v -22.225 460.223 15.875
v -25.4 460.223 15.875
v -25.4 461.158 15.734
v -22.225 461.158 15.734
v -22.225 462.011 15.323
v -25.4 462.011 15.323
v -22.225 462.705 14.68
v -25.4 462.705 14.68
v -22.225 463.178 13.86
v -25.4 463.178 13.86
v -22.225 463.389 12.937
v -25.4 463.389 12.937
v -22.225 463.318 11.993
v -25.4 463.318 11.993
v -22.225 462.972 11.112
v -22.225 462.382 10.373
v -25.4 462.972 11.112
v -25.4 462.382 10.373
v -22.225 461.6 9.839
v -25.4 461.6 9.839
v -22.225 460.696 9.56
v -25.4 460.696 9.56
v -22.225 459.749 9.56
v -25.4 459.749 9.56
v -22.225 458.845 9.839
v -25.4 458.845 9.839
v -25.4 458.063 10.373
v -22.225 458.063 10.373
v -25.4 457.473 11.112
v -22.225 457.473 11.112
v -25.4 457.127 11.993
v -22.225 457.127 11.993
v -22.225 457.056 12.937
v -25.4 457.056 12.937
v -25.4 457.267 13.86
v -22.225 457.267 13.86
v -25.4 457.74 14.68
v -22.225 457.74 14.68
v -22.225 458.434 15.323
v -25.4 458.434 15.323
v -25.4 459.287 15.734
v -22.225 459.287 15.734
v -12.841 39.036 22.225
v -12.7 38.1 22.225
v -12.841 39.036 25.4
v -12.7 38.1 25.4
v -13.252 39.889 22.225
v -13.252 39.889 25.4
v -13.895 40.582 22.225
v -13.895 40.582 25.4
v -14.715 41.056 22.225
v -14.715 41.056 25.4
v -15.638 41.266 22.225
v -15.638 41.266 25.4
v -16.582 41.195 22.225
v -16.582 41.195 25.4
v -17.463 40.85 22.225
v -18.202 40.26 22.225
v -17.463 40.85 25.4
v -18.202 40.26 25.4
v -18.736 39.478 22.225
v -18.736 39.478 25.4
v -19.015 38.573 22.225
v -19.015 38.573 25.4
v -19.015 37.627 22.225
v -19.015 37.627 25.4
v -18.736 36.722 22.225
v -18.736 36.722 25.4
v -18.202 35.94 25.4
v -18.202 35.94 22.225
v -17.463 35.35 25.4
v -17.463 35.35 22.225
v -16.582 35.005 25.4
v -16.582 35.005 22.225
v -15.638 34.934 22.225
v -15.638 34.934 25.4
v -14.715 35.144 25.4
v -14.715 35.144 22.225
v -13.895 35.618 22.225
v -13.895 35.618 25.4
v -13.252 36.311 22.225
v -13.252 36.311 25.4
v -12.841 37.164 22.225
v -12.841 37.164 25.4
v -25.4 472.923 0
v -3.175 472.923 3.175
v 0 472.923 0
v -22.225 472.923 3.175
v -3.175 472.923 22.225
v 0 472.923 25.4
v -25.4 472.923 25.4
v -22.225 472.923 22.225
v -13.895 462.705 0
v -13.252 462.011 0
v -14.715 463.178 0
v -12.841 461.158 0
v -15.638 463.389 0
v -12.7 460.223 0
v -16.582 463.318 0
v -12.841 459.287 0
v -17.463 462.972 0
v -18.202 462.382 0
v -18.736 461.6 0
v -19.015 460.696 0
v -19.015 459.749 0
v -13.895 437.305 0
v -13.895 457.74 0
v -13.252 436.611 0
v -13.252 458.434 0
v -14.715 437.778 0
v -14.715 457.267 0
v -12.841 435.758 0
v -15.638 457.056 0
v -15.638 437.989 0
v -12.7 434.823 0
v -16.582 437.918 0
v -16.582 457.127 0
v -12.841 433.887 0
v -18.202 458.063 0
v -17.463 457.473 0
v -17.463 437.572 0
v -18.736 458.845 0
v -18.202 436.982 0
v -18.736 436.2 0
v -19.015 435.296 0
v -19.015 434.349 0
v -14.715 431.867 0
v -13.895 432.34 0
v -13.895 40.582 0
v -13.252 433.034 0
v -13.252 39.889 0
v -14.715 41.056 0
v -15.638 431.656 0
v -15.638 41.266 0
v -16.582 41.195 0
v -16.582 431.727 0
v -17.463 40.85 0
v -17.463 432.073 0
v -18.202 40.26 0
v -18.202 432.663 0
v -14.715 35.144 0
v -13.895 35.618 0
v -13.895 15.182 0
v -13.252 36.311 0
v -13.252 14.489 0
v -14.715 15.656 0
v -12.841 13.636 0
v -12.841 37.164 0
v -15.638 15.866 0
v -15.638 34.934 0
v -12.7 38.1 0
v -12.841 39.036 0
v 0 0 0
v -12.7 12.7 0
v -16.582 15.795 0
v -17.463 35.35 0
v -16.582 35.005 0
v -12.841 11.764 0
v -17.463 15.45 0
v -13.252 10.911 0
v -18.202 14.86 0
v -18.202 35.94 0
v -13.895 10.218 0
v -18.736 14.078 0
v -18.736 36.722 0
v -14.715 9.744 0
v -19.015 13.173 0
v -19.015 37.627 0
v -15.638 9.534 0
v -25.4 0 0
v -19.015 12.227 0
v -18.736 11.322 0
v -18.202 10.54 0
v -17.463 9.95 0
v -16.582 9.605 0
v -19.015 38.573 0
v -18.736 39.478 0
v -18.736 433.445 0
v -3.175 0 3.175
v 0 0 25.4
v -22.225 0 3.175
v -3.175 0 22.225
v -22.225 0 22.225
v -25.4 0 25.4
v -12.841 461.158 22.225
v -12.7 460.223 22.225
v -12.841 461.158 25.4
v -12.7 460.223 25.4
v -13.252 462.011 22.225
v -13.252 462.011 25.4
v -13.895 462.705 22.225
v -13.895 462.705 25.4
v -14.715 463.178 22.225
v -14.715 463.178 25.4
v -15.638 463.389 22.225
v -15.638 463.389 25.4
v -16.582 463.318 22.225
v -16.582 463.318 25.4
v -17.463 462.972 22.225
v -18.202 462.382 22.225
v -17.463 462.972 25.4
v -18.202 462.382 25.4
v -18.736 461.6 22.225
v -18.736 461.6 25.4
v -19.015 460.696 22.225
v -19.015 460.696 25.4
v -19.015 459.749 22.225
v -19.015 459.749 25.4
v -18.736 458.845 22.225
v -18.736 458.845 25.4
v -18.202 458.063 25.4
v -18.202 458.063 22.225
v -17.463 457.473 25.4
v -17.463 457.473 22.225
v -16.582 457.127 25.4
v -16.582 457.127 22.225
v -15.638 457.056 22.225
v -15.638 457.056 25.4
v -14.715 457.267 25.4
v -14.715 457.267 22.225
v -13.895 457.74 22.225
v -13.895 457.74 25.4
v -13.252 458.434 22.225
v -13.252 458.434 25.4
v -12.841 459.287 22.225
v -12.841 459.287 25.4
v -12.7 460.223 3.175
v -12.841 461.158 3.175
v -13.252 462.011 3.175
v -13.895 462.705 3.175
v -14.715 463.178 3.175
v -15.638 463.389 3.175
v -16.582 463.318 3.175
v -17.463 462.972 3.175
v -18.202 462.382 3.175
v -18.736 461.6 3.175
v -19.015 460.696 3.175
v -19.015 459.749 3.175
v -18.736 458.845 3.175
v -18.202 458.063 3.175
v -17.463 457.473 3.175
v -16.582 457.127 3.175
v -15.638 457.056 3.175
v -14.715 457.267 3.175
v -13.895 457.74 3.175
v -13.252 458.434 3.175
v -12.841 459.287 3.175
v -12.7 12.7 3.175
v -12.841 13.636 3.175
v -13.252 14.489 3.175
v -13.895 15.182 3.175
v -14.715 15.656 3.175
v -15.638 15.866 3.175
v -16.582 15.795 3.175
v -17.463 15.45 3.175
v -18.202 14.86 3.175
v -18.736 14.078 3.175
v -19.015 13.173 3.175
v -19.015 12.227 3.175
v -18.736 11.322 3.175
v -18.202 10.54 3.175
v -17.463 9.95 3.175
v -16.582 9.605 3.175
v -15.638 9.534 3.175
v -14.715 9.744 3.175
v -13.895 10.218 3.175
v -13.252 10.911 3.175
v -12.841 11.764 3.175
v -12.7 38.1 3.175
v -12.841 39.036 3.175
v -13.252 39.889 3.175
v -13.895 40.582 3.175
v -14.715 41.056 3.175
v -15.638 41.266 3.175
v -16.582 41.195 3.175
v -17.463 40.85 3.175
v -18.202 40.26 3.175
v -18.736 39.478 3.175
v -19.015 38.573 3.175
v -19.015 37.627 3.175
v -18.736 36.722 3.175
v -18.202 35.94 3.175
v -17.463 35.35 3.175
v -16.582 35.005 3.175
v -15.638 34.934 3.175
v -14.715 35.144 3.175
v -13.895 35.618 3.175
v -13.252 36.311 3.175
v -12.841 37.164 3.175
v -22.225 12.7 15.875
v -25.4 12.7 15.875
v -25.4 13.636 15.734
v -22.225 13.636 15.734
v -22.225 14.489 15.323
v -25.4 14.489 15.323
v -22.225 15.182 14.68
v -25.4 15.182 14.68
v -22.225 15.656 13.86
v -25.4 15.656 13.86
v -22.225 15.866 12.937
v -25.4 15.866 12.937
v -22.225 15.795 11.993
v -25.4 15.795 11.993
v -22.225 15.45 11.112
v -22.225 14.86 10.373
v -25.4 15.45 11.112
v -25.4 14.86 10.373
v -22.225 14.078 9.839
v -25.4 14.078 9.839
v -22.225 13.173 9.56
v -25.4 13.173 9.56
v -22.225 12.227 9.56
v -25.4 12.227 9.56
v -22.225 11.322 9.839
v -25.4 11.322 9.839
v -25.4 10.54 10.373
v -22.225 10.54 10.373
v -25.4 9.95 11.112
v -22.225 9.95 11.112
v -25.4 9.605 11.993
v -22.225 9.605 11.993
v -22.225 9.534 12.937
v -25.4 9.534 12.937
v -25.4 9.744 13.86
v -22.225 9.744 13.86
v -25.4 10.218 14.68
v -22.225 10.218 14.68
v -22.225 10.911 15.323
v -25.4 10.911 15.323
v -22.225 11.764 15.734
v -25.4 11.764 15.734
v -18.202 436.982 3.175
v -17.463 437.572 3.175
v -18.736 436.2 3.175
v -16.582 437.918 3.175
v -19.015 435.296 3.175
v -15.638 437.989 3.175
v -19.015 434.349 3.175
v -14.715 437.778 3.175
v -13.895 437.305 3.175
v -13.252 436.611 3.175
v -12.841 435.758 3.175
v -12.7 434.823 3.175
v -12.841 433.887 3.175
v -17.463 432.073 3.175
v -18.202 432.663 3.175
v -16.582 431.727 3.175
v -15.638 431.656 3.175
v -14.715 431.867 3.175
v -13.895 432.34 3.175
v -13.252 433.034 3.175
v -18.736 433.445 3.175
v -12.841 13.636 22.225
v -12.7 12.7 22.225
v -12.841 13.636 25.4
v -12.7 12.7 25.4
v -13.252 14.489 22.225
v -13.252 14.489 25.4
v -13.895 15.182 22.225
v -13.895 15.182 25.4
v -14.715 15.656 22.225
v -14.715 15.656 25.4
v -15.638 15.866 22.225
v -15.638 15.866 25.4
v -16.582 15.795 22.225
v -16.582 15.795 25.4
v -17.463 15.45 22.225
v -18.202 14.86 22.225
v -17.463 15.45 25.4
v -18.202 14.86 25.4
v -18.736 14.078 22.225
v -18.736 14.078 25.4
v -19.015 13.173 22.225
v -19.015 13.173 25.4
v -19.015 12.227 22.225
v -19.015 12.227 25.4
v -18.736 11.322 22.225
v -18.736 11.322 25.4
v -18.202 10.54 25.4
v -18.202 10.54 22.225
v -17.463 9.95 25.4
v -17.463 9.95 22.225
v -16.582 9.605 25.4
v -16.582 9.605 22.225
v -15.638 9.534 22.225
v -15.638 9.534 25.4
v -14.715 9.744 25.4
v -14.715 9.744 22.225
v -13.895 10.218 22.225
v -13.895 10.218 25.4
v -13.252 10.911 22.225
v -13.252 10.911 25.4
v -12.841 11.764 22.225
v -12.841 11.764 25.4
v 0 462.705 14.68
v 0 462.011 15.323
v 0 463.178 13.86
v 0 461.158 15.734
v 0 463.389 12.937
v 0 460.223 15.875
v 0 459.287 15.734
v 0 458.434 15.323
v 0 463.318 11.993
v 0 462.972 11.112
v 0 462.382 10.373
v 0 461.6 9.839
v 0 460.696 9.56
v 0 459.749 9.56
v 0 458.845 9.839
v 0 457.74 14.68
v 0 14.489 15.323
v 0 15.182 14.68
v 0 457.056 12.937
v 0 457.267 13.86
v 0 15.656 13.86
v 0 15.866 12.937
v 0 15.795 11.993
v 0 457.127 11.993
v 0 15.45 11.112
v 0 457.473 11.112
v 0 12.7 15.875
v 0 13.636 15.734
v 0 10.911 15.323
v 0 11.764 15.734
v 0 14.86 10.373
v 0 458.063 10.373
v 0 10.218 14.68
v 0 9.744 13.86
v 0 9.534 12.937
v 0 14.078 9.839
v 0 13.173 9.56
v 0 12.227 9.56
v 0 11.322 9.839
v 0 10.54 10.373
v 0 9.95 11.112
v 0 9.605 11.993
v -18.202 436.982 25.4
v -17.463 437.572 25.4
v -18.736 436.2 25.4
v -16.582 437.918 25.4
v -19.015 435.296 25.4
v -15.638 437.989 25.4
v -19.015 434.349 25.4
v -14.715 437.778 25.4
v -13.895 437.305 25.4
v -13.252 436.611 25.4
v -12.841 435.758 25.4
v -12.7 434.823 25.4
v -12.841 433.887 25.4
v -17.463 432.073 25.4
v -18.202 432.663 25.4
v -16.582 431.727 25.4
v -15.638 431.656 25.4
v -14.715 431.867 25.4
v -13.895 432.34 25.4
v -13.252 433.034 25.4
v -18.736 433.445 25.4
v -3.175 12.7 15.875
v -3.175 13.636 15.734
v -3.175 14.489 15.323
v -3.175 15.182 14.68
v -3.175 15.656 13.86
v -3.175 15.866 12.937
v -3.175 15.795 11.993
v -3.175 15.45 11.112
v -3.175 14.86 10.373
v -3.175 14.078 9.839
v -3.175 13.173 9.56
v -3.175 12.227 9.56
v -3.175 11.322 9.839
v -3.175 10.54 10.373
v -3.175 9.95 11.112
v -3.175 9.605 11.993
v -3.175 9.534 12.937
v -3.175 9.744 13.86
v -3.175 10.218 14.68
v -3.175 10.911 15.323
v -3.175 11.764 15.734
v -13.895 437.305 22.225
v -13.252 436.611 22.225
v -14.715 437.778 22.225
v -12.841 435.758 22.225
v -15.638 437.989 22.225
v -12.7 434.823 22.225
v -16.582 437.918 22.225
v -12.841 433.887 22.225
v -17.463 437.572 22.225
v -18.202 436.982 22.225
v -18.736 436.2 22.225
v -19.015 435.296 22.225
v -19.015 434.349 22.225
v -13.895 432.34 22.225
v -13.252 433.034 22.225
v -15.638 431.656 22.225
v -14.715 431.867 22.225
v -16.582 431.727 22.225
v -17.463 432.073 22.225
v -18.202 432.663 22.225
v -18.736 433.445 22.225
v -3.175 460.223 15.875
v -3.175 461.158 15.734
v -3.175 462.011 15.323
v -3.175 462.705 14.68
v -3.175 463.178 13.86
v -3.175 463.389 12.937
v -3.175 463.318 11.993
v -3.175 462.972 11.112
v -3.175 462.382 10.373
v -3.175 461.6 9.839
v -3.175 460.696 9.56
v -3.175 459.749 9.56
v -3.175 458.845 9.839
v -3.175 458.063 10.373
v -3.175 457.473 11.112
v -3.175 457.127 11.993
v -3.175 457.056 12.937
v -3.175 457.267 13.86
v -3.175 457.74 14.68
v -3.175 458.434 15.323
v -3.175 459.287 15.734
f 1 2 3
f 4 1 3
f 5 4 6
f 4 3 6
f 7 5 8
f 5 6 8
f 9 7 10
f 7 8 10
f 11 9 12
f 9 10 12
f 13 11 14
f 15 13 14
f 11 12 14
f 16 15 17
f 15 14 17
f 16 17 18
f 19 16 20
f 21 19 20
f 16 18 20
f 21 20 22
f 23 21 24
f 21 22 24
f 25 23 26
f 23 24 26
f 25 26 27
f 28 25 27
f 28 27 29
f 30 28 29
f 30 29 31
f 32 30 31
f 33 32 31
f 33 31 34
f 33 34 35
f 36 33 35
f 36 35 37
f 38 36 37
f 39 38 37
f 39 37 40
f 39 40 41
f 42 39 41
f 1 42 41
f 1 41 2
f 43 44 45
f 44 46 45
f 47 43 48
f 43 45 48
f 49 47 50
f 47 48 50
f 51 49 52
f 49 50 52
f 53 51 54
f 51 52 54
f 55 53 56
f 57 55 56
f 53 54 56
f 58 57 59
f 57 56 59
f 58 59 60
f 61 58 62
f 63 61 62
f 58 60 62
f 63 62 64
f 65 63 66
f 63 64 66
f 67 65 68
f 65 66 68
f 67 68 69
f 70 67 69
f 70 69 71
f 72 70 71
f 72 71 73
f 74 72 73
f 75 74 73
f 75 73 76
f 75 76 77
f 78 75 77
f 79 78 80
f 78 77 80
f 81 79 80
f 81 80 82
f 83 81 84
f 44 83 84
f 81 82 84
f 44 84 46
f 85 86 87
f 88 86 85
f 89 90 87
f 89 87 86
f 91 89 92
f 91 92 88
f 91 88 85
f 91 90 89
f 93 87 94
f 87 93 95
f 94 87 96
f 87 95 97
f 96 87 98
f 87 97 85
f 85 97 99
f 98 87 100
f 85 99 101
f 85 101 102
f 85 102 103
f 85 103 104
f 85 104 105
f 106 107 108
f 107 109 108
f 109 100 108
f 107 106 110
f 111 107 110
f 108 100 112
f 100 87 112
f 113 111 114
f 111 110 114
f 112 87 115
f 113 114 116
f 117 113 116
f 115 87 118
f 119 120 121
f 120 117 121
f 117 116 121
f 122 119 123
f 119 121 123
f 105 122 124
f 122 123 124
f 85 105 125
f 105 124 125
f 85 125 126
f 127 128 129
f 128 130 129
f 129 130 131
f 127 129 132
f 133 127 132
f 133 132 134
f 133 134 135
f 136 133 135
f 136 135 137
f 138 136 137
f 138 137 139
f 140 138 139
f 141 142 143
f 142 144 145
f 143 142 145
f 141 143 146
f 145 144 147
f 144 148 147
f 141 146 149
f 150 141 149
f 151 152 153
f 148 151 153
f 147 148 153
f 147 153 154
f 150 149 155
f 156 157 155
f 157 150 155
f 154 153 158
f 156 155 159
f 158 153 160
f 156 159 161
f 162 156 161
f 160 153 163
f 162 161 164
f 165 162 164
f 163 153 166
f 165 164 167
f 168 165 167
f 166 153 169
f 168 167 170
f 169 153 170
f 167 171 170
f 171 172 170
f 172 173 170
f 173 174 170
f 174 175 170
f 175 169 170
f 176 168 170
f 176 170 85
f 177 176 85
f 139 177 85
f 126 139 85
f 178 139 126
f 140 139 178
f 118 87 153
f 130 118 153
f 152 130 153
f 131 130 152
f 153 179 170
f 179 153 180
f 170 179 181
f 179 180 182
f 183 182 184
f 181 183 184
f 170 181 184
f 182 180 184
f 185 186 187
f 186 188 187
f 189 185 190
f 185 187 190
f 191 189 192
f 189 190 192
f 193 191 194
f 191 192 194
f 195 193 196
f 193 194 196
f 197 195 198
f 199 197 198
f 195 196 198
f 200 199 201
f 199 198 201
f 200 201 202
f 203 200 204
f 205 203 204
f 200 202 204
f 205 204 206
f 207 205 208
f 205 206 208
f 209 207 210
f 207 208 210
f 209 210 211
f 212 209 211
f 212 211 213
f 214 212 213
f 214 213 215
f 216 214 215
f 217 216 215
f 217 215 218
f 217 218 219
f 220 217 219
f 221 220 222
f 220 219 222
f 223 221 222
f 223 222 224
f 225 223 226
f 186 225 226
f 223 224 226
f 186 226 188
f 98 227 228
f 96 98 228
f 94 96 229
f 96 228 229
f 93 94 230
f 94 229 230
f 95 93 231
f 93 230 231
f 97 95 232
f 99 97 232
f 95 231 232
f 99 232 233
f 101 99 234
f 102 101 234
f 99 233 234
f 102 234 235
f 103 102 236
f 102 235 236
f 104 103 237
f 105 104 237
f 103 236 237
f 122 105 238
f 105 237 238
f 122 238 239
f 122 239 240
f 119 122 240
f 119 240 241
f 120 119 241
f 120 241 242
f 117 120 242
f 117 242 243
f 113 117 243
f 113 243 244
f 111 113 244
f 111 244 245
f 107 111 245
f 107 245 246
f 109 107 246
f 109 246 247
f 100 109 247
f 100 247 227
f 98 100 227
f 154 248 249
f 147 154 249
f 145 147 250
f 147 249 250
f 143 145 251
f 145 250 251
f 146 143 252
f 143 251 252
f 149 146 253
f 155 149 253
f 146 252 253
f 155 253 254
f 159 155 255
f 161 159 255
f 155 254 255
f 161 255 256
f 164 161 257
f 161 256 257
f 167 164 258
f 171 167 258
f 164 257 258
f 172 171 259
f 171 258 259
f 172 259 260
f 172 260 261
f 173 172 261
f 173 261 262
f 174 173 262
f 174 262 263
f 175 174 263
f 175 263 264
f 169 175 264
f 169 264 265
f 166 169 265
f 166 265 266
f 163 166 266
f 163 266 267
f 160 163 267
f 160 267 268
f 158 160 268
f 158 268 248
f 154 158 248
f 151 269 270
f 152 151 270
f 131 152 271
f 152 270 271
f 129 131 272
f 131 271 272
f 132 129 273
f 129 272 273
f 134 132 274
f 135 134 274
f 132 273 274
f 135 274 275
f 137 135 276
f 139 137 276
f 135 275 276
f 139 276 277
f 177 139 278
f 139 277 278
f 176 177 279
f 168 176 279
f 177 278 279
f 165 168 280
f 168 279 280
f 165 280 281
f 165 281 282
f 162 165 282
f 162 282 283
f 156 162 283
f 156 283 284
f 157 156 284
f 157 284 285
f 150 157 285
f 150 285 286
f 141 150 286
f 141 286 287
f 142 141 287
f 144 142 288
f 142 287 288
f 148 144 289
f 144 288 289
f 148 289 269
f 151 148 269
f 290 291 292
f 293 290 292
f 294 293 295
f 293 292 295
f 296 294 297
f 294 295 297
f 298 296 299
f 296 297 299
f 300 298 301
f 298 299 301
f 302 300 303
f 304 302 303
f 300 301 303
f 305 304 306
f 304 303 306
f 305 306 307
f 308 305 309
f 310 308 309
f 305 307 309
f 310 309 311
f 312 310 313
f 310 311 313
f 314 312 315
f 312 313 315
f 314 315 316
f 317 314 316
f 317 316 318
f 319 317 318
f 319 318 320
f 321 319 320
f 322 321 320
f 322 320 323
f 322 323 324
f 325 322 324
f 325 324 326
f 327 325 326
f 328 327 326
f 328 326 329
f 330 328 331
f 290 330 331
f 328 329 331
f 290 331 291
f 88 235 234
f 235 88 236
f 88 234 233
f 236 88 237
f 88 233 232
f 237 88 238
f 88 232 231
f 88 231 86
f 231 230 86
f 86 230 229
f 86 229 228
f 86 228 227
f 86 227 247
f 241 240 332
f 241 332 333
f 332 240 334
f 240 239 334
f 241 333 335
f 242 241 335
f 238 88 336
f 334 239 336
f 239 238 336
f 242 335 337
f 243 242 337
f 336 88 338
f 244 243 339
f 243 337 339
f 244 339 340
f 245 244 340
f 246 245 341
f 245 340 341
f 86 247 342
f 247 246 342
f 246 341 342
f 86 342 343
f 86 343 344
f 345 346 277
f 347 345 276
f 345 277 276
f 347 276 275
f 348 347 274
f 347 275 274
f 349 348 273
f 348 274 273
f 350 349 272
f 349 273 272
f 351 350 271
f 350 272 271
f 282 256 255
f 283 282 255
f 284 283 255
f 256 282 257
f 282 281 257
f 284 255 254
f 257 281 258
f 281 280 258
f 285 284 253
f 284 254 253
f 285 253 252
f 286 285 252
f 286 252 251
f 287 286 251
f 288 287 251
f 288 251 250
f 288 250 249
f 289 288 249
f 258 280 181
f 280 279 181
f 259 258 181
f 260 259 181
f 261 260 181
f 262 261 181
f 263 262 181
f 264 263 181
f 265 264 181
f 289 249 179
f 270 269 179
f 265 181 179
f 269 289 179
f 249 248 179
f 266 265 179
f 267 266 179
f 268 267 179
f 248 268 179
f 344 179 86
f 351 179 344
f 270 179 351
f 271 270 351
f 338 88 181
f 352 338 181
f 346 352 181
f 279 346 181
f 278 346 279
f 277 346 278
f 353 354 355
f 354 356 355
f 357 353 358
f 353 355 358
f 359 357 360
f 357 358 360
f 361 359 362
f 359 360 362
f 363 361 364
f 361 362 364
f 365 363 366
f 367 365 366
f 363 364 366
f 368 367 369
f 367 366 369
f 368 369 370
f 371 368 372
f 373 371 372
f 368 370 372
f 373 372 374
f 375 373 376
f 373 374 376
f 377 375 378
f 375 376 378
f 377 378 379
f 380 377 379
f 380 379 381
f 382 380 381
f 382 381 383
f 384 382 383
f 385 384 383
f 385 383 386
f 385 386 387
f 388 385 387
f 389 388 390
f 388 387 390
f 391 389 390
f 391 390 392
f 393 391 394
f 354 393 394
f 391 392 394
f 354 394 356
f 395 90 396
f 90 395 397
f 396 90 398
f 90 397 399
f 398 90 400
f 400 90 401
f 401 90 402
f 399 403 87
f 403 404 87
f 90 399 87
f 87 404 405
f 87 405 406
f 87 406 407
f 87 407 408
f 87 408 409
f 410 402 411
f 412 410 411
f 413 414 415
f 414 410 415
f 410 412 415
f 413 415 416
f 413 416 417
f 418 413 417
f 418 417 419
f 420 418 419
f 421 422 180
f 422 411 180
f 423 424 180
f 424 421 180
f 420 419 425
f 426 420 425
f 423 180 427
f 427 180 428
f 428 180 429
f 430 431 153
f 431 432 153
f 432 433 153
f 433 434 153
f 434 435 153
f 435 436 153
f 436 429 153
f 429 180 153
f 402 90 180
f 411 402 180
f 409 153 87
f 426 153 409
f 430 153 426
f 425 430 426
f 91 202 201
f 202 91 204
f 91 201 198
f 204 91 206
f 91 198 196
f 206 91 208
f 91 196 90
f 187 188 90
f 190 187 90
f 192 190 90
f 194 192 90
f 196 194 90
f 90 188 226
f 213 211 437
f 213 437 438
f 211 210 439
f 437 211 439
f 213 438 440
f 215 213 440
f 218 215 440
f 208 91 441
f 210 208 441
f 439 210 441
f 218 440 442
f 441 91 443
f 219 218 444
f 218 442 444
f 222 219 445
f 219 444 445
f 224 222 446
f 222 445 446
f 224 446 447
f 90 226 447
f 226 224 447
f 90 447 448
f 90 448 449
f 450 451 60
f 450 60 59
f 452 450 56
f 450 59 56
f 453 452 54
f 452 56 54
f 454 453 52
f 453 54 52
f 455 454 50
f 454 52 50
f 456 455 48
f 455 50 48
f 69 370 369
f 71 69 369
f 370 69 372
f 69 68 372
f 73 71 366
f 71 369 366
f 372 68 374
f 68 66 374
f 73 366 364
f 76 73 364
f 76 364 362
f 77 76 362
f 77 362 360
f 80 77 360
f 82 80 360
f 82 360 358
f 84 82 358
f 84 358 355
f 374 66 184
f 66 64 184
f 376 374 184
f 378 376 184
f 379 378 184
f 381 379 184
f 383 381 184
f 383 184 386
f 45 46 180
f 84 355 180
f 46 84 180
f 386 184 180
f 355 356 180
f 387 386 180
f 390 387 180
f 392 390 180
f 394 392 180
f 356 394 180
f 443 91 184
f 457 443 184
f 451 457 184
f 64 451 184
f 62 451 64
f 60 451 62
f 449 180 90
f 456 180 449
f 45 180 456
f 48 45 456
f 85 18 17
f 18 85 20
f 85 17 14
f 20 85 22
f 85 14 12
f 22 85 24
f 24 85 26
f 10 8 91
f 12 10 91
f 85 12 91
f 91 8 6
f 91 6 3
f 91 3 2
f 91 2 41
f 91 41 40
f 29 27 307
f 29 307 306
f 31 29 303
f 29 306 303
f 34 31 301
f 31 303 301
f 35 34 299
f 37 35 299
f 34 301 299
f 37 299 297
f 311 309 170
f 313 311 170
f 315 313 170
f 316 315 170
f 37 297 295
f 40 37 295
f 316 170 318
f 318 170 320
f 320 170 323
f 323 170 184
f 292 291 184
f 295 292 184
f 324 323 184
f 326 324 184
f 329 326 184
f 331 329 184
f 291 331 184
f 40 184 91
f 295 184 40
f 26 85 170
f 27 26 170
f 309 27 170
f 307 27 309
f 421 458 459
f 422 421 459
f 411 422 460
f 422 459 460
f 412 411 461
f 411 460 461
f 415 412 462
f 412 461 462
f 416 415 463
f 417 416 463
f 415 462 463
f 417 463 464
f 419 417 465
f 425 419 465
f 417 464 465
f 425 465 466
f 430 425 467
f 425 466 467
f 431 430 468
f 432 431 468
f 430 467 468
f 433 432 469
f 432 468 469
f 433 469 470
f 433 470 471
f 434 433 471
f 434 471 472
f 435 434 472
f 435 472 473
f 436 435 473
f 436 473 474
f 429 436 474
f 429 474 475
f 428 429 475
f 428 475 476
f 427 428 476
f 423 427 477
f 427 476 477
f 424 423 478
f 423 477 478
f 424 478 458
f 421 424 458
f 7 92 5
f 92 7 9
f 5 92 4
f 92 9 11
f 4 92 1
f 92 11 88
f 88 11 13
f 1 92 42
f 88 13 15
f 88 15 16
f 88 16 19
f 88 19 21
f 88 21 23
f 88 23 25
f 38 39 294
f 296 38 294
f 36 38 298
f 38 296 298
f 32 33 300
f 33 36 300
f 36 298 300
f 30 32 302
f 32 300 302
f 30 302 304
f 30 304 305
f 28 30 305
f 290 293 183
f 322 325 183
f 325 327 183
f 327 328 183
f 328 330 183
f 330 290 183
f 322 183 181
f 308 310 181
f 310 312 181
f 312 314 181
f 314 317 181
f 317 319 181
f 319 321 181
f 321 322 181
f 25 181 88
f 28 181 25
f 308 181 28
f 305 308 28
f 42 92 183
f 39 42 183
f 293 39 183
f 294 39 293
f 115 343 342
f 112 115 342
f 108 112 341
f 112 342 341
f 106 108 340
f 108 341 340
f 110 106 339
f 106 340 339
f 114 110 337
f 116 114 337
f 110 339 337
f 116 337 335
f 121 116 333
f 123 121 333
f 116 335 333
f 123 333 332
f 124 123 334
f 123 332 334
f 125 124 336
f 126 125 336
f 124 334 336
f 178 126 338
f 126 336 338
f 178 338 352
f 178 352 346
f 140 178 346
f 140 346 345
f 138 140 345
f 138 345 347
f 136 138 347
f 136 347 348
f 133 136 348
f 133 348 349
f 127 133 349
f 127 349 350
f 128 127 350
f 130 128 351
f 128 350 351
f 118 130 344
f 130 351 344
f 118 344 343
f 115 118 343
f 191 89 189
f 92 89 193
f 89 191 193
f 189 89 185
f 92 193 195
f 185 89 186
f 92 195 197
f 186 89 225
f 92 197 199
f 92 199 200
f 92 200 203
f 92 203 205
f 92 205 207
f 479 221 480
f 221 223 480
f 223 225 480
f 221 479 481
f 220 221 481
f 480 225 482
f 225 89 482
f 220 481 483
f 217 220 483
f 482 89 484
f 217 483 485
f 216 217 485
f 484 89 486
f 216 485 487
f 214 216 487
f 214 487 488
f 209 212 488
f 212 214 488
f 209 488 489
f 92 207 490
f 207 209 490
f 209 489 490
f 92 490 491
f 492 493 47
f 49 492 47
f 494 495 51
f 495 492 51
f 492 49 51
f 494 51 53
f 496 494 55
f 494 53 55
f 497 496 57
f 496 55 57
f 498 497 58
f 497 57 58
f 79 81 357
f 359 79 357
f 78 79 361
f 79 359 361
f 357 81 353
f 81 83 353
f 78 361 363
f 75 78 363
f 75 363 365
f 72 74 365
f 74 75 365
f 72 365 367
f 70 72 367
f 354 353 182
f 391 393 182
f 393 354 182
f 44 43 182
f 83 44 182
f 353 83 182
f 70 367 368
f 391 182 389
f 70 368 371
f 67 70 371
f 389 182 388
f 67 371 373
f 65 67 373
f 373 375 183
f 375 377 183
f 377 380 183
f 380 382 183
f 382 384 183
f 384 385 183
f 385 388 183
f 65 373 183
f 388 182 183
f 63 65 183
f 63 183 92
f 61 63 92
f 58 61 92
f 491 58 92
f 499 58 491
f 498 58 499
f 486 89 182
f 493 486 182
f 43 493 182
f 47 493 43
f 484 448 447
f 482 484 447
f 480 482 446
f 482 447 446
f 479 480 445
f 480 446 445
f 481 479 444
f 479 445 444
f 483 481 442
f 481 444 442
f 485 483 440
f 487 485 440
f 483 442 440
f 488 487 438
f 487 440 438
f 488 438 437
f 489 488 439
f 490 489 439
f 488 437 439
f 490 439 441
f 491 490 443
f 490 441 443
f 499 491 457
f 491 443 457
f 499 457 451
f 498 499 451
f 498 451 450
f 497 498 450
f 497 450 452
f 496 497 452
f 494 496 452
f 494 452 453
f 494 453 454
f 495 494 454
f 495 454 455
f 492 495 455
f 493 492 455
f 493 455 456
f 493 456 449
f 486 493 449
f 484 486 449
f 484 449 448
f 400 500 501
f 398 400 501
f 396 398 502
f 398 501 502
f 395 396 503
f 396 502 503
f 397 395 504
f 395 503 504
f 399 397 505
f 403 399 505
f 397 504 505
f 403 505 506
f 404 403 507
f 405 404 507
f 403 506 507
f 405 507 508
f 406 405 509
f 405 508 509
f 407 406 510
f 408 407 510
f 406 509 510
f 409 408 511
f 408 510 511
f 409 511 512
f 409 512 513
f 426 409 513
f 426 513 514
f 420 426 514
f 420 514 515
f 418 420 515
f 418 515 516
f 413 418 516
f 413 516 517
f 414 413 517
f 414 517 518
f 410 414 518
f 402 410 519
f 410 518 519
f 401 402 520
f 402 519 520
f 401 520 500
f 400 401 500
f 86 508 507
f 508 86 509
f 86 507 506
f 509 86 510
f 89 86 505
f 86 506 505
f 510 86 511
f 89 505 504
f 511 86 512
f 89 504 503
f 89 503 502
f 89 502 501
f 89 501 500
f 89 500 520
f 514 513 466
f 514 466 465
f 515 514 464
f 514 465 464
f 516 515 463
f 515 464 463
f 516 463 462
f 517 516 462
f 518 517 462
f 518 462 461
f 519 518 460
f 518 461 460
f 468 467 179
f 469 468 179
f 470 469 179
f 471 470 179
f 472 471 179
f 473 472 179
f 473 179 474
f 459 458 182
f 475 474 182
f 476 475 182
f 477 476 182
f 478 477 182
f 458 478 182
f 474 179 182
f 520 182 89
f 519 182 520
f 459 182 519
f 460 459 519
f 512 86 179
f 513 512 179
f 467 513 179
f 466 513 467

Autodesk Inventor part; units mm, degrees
ref_plane "YZ Plane" through (0, 0, 0) normal (1, 0, 0) x (0, 1, 0)
ref_plane "XZ Plane" through (0, 0, 0) normal (0, 1, 0) x (-1, 0, 0)
ref_plane "XY Plane" through (0, 0, 0) normal (0, 0, 1) x (1, 0, 0)
sketch "Sketch1" plane through (0, 0, 0) normal (0, 1, 0) x (-1, 0, 0)
  line L0 (0, 0) -> (25.4, 0)
  line L1 (25.4, 0) -> (25.4, 25.4)
  line L2 (25.4, 25.4) -> (0, 25.4)
  line L3 (0, 25.4) -> (0, 0)
  line L4 (22.225, 22.225) -> (22.225, 3.175)
  line L5 (22.225, 3.175) -> (3.175, 3.175)
  line L6 (3.175, 3.175) -> (3.175, 22.225)
  line L7 (3.175, 22.225) -> (22.225, 22.225)
  dimension "d0" = 25.4
  dimension "d1" = 25.4
  dimension "d2" = 3.175
extrude "Extrusion1" add sketch "Sketch1" along normal blind 472.9226
sketch "Sketch2" plane through (-25.4, 0, 0) normal (-1, 0, 0) x (0, 0, 1)
  circle A0 centre (12.7, 12.7) radius 3.175
  circle A1 centre (12.7, 460.2226) radius 3.175
  line L0 (22.225, 472.9226) -> (3.175, 472.9226) projected
  line L1 (25.4, 0) -> (25.4, 472.9226) projected
  line L2 (25.4, 0) -> (25.4, 472.9226) projected
  line L3 (0, 0) -> (25.4, 0) projected
  dimension "d5" = 6.35
  dimension "d6" = 6.35
  dimension "d7" = 12.7
  dimension "d8" = 12.7
  dimension "d9" = 12.7
  dimension "d10" = 12.7
extrude "Extrusion2" cut sketch "Sketch2" against normal blind 25.4
sketch "Sketch3" plane through (-25.4, 0, 25.4) normal (0, 0, 1) x (1, 0, 0)
  circle A0 centre (9.525, 460.2226) radius 3.175
  circle A1 centre (9.525, 434.8226) radius 3.175
  line L0 (0, 472.9226) -> (25.4, 472.9226) projected
  line L1 (0, 0) -> (0, 472.9226) projected
  circle A2 centre (9.525, 12.7) radius 3.175
  circle A3 centre (9.525, 38.1) radius 3.175
  line L2 (0, 0) -> (25.4, 0) projected
  dimension "d13" = 12.7
  dimension "d14" = 9.525
  dimension "d15" = 9.525
  dimension "d16" = 6.35
  dimension "d17" = 38.1
  dimension "d18" = 6.35
  dimension "d19" = 6.35
  dimension "d20" = 9.525
  dimension "d21" = 9.525
  dimension "d22" = 38.1
  dimension "d23" = 12.7
extrude "Extrusion3" cut sketch "Sketch3" against normal blind 25.4
properties part number "15102898-16-P-0206" material "Aluminum 6061"
